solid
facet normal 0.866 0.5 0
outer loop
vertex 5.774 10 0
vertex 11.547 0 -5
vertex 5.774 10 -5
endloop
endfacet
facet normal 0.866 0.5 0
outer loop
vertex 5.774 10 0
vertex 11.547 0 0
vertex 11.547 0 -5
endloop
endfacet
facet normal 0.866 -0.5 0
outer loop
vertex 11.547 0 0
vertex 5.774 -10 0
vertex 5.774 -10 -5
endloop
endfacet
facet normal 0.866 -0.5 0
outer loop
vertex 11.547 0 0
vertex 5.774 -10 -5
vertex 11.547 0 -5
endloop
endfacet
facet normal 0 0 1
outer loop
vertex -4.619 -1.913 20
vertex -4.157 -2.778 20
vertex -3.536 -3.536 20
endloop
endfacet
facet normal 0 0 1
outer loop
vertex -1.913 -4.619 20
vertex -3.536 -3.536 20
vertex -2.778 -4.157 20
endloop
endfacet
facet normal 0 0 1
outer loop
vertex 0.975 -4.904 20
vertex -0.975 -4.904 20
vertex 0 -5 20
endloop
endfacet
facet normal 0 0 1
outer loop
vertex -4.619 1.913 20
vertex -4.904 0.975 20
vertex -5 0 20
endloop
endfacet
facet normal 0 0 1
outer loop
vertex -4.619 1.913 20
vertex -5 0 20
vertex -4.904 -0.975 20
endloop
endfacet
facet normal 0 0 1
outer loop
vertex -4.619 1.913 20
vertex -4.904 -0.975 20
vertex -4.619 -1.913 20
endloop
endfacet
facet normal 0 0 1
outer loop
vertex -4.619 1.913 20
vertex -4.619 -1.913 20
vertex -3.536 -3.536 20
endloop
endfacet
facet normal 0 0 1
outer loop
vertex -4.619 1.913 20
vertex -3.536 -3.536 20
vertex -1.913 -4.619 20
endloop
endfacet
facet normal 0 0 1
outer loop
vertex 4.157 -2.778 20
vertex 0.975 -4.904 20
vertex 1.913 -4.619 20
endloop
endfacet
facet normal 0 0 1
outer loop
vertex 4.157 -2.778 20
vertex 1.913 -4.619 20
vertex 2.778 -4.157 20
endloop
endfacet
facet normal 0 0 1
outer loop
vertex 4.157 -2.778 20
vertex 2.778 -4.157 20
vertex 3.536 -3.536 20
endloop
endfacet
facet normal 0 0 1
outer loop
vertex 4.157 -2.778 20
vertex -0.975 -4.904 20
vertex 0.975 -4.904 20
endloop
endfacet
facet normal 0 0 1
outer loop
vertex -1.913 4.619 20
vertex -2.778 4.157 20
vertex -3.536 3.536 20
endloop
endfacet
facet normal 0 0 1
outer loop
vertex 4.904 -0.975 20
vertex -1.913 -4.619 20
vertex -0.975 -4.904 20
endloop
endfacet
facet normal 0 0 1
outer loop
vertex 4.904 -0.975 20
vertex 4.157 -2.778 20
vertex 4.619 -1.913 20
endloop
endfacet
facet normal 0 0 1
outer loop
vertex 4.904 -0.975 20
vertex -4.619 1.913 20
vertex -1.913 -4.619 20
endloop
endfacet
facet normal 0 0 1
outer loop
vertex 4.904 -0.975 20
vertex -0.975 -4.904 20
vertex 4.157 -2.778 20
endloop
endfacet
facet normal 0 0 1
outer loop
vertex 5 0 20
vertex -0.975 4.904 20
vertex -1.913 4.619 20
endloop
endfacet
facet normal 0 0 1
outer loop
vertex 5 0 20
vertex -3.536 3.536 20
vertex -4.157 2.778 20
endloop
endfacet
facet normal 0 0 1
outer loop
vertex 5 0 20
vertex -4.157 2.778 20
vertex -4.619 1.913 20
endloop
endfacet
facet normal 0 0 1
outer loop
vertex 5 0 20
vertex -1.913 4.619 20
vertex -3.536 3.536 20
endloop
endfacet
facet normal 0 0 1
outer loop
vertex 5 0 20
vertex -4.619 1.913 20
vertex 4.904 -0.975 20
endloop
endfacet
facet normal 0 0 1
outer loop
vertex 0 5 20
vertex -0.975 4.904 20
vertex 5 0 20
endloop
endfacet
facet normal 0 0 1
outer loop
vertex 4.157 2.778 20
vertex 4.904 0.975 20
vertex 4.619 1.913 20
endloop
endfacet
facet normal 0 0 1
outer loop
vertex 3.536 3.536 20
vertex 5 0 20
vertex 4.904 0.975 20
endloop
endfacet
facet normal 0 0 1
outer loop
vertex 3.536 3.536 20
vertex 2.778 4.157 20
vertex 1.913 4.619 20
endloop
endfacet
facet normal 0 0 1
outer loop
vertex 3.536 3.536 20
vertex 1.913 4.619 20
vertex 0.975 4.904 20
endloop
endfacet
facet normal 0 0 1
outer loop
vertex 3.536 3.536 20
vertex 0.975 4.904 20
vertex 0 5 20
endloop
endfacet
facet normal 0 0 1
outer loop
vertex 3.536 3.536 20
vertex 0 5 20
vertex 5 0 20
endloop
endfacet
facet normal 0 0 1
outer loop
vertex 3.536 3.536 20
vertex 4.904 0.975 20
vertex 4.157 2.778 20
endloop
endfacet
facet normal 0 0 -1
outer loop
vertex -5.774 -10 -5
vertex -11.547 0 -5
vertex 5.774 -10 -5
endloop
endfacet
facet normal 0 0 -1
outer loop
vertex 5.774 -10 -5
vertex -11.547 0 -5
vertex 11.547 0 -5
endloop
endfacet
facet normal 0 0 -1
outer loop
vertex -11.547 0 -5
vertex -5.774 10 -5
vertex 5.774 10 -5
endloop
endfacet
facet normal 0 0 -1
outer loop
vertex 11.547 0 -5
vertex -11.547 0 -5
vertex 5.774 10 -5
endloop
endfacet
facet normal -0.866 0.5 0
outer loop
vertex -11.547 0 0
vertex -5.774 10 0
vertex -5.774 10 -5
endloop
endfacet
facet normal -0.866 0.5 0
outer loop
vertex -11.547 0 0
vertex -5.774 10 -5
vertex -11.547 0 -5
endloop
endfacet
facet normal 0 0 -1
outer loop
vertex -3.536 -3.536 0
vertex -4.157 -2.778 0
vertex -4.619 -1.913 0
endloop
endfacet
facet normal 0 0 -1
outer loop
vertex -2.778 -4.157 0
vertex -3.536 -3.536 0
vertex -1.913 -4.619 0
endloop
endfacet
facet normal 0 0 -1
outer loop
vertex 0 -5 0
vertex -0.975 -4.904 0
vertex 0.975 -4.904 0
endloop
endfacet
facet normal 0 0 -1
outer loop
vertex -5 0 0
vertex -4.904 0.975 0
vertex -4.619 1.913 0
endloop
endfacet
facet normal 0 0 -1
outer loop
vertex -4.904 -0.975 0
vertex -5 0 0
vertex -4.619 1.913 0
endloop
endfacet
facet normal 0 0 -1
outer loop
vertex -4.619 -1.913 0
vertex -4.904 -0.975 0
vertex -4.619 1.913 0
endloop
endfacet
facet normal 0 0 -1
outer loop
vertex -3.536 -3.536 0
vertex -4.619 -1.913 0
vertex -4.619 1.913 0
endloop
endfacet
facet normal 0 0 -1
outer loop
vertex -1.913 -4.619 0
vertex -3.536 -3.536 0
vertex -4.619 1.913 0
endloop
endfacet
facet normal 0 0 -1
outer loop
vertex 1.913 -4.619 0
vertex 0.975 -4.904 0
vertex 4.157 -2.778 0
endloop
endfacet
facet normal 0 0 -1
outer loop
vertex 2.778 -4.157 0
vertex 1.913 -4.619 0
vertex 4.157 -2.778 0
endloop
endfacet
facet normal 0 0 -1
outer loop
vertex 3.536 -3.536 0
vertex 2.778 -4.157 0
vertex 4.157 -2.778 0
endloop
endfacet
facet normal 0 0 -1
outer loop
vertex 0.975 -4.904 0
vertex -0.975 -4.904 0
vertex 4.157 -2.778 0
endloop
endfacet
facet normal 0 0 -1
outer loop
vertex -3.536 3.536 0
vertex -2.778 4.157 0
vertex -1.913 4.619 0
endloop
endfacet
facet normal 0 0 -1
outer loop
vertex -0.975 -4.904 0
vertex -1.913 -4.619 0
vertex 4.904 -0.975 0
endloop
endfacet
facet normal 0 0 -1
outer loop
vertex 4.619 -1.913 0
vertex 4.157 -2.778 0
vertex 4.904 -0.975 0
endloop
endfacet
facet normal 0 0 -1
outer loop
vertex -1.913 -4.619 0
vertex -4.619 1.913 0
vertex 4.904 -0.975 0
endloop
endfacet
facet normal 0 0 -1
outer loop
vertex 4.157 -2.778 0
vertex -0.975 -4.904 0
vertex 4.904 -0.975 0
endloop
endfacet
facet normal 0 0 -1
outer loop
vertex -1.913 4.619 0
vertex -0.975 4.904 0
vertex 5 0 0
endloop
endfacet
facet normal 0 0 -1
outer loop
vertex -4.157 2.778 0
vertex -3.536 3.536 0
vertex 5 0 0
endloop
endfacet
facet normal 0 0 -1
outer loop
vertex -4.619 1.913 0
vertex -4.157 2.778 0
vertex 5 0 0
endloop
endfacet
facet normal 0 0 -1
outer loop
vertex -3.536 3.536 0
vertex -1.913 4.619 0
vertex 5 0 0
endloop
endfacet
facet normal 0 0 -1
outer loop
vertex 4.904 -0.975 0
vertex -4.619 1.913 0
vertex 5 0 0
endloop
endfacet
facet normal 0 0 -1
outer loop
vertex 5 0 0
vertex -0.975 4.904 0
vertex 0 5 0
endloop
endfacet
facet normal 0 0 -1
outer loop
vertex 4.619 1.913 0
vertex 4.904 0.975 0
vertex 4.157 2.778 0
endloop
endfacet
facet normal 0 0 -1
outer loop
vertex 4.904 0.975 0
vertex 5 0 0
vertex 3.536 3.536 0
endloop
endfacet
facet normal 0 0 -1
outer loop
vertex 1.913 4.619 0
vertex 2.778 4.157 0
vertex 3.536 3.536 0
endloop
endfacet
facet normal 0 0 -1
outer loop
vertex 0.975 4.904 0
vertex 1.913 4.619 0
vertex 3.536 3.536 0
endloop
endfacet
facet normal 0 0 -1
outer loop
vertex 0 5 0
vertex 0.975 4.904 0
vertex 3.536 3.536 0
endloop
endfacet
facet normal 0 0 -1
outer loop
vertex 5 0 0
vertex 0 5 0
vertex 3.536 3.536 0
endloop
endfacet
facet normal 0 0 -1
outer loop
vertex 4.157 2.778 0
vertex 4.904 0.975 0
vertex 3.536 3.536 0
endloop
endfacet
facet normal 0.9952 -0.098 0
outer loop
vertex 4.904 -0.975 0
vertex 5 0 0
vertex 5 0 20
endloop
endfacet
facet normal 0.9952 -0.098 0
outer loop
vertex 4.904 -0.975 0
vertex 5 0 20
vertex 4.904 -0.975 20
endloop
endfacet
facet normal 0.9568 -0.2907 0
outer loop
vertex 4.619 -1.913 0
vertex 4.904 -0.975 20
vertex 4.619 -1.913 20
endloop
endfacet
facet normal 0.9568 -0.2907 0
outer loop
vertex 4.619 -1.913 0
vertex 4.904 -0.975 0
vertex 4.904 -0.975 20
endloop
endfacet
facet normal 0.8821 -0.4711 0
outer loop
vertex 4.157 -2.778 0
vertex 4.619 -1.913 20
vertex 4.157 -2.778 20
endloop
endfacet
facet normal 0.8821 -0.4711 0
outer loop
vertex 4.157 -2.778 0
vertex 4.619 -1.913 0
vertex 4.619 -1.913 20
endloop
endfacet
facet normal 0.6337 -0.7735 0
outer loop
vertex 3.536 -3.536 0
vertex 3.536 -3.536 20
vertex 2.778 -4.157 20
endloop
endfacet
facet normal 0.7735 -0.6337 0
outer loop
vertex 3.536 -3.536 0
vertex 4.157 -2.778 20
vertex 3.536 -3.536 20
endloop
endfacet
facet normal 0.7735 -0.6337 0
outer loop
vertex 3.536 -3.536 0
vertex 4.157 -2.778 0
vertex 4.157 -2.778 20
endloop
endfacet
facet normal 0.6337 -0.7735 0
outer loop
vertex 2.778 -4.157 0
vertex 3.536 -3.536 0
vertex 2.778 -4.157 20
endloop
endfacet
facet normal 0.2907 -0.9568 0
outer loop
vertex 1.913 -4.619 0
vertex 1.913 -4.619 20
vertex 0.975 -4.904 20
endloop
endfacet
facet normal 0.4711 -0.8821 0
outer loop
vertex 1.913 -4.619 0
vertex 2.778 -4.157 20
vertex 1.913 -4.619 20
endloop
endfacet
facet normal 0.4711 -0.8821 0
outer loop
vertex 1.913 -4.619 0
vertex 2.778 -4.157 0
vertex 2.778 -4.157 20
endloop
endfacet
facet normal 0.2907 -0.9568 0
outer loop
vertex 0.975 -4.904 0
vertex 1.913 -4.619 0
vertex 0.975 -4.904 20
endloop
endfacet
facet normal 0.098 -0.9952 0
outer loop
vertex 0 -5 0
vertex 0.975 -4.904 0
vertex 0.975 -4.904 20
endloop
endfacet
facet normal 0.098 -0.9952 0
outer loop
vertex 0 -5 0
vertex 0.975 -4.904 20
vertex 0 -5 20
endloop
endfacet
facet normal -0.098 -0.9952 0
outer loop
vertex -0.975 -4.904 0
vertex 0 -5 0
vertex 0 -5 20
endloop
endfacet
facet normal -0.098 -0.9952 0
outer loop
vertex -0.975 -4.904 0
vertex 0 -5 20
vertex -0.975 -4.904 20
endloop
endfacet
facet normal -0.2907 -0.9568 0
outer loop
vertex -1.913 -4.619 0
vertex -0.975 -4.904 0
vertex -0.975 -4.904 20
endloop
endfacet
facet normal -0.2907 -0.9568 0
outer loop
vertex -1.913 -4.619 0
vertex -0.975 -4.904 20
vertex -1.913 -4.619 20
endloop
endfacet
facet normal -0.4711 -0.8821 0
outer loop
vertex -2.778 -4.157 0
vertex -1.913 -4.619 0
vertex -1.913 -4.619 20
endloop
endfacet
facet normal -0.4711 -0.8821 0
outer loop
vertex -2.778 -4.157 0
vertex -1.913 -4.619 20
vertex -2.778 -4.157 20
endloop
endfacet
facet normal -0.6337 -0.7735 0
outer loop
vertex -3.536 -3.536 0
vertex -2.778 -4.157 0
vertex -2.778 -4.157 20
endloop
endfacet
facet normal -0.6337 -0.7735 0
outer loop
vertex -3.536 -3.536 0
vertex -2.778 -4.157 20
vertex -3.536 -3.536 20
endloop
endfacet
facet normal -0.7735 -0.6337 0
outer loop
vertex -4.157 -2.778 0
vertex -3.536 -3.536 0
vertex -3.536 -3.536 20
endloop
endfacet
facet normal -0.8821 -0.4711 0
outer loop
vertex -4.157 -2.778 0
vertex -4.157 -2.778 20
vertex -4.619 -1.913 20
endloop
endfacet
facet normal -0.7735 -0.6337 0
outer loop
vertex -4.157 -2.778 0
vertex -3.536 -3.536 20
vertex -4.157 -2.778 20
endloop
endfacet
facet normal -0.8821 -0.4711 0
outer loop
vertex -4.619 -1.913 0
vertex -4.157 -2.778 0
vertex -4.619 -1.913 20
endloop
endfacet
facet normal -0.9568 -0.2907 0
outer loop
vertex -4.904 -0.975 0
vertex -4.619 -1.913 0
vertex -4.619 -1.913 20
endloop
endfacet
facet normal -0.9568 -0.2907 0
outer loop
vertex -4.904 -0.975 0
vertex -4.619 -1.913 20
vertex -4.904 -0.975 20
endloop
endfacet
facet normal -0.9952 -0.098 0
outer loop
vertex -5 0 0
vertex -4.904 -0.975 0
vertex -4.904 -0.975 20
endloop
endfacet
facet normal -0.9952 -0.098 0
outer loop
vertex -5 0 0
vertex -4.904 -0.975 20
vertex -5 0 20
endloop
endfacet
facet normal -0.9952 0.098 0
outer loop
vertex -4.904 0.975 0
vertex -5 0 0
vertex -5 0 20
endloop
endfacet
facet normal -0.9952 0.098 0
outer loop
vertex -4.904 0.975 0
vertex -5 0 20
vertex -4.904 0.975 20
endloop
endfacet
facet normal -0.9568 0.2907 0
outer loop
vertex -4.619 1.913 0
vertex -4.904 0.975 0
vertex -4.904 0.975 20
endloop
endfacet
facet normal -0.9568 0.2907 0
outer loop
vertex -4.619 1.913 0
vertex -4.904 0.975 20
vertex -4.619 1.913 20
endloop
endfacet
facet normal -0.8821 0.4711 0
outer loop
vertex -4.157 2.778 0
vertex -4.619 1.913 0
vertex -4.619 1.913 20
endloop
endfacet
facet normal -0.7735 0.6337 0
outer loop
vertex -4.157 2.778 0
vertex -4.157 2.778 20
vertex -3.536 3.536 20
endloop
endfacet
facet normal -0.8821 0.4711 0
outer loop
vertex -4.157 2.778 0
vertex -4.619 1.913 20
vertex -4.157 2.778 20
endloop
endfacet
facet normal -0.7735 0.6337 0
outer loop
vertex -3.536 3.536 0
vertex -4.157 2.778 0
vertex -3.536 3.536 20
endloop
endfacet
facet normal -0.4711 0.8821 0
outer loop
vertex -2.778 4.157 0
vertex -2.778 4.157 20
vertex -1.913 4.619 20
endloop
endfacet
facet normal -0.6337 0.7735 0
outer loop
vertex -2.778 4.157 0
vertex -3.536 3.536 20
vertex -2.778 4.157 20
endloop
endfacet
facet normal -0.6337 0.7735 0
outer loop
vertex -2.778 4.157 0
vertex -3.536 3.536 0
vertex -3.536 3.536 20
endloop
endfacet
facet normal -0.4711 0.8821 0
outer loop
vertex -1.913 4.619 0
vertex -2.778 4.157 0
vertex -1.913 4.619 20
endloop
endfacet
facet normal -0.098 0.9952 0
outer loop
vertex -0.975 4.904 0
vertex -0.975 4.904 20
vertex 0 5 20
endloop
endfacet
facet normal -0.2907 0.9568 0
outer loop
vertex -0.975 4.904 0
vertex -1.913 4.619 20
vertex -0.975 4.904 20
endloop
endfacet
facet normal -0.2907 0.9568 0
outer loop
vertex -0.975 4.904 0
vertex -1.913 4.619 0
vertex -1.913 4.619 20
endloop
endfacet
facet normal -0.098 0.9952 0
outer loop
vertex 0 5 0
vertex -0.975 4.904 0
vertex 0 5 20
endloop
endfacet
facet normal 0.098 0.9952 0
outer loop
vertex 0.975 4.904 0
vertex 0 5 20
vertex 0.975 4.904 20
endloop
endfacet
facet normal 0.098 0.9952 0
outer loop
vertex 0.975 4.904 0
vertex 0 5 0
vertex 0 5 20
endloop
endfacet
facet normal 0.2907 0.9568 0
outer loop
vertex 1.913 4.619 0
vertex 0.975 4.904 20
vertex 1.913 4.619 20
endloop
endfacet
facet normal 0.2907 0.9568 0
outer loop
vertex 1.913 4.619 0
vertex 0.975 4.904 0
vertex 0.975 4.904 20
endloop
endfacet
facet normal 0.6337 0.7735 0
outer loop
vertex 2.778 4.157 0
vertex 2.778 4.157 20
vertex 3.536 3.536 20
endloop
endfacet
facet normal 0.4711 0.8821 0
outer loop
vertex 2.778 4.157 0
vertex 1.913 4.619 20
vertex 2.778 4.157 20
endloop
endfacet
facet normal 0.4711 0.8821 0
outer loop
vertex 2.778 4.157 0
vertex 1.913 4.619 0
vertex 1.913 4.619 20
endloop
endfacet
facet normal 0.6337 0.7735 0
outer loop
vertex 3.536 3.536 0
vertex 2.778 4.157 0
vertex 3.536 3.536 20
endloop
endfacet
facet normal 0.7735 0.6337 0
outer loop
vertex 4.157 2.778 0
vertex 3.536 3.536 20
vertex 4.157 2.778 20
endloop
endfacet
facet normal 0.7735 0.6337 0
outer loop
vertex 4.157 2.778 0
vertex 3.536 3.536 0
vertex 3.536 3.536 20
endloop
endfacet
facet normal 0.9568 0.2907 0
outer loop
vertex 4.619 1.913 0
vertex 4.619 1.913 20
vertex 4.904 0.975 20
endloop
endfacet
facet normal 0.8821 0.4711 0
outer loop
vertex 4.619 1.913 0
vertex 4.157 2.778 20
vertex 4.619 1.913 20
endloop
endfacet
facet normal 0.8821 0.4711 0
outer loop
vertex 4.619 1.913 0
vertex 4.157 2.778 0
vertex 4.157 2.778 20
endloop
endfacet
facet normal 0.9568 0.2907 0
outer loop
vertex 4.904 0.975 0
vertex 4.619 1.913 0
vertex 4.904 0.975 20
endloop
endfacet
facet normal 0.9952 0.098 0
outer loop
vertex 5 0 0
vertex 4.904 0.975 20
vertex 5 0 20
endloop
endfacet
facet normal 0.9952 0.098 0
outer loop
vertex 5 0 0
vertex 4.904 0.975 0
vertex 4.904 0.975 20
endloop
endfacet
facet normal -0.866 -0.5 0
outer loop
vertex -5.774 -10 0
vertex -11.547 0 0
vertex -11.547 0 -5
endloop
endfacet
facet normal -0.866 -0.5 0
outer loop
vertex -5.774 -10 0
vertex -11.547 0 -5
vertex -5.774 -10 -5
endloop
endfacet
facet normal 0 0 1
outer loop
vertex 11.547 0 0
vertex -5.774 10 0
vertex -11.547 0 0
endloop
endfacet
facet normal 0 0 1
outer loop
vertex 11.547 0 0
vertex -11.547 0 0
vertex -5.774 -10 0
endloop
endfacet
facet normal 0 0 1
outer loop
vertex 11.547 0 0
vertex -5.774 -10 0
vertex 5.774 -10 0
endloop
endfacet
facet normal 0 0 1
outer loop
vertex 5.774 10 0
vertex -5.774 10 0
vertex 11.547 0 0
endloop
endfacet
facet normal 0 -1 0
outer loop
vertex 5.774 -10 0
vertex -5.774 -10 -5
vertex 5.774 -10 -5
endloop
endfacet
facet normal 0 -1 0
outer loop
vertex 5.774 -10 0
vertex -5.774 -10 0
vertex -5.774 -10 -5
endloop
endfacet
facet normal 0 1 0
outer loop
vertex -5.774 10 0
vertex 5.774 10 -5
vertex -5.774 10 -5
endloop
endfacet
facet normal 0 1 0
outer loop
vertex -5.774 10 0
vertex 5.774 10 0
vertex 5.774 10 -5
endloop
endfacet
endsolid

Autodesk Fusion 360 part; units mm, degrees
sketch "Sketch1" plane through (0, 0, 0) normal (0, 0, 1) x (1, 0, 0)
  circle A0 centre (0, 0) radius 5
  line L0 (5.7735, -10) -> (11.547, 0)
  line L1 (11.547, 0) -> (5.7735, 10)
  line L2 (5.7735, 10) -> (-5.7735, 10)
  line L3 (-5.7735, 10) -> (-11.547, 0)
  line L4 (-11.547, 0) -> (-5.7735, -10)
  line L5 (-5.7735, -10) -> (5.7735, -10)
  dimension "d1" = 10
  dimension "d2" = 10
extrude "Extrude1" add sketch "Sketch1" along normal blind 20 contours A0 makes body 1
extrude "Extrude2" add sketch "Sketch1" against normal blind 5 separate body contours A0 | L0 L1 L2 L3 L4 L5 makes body 2
